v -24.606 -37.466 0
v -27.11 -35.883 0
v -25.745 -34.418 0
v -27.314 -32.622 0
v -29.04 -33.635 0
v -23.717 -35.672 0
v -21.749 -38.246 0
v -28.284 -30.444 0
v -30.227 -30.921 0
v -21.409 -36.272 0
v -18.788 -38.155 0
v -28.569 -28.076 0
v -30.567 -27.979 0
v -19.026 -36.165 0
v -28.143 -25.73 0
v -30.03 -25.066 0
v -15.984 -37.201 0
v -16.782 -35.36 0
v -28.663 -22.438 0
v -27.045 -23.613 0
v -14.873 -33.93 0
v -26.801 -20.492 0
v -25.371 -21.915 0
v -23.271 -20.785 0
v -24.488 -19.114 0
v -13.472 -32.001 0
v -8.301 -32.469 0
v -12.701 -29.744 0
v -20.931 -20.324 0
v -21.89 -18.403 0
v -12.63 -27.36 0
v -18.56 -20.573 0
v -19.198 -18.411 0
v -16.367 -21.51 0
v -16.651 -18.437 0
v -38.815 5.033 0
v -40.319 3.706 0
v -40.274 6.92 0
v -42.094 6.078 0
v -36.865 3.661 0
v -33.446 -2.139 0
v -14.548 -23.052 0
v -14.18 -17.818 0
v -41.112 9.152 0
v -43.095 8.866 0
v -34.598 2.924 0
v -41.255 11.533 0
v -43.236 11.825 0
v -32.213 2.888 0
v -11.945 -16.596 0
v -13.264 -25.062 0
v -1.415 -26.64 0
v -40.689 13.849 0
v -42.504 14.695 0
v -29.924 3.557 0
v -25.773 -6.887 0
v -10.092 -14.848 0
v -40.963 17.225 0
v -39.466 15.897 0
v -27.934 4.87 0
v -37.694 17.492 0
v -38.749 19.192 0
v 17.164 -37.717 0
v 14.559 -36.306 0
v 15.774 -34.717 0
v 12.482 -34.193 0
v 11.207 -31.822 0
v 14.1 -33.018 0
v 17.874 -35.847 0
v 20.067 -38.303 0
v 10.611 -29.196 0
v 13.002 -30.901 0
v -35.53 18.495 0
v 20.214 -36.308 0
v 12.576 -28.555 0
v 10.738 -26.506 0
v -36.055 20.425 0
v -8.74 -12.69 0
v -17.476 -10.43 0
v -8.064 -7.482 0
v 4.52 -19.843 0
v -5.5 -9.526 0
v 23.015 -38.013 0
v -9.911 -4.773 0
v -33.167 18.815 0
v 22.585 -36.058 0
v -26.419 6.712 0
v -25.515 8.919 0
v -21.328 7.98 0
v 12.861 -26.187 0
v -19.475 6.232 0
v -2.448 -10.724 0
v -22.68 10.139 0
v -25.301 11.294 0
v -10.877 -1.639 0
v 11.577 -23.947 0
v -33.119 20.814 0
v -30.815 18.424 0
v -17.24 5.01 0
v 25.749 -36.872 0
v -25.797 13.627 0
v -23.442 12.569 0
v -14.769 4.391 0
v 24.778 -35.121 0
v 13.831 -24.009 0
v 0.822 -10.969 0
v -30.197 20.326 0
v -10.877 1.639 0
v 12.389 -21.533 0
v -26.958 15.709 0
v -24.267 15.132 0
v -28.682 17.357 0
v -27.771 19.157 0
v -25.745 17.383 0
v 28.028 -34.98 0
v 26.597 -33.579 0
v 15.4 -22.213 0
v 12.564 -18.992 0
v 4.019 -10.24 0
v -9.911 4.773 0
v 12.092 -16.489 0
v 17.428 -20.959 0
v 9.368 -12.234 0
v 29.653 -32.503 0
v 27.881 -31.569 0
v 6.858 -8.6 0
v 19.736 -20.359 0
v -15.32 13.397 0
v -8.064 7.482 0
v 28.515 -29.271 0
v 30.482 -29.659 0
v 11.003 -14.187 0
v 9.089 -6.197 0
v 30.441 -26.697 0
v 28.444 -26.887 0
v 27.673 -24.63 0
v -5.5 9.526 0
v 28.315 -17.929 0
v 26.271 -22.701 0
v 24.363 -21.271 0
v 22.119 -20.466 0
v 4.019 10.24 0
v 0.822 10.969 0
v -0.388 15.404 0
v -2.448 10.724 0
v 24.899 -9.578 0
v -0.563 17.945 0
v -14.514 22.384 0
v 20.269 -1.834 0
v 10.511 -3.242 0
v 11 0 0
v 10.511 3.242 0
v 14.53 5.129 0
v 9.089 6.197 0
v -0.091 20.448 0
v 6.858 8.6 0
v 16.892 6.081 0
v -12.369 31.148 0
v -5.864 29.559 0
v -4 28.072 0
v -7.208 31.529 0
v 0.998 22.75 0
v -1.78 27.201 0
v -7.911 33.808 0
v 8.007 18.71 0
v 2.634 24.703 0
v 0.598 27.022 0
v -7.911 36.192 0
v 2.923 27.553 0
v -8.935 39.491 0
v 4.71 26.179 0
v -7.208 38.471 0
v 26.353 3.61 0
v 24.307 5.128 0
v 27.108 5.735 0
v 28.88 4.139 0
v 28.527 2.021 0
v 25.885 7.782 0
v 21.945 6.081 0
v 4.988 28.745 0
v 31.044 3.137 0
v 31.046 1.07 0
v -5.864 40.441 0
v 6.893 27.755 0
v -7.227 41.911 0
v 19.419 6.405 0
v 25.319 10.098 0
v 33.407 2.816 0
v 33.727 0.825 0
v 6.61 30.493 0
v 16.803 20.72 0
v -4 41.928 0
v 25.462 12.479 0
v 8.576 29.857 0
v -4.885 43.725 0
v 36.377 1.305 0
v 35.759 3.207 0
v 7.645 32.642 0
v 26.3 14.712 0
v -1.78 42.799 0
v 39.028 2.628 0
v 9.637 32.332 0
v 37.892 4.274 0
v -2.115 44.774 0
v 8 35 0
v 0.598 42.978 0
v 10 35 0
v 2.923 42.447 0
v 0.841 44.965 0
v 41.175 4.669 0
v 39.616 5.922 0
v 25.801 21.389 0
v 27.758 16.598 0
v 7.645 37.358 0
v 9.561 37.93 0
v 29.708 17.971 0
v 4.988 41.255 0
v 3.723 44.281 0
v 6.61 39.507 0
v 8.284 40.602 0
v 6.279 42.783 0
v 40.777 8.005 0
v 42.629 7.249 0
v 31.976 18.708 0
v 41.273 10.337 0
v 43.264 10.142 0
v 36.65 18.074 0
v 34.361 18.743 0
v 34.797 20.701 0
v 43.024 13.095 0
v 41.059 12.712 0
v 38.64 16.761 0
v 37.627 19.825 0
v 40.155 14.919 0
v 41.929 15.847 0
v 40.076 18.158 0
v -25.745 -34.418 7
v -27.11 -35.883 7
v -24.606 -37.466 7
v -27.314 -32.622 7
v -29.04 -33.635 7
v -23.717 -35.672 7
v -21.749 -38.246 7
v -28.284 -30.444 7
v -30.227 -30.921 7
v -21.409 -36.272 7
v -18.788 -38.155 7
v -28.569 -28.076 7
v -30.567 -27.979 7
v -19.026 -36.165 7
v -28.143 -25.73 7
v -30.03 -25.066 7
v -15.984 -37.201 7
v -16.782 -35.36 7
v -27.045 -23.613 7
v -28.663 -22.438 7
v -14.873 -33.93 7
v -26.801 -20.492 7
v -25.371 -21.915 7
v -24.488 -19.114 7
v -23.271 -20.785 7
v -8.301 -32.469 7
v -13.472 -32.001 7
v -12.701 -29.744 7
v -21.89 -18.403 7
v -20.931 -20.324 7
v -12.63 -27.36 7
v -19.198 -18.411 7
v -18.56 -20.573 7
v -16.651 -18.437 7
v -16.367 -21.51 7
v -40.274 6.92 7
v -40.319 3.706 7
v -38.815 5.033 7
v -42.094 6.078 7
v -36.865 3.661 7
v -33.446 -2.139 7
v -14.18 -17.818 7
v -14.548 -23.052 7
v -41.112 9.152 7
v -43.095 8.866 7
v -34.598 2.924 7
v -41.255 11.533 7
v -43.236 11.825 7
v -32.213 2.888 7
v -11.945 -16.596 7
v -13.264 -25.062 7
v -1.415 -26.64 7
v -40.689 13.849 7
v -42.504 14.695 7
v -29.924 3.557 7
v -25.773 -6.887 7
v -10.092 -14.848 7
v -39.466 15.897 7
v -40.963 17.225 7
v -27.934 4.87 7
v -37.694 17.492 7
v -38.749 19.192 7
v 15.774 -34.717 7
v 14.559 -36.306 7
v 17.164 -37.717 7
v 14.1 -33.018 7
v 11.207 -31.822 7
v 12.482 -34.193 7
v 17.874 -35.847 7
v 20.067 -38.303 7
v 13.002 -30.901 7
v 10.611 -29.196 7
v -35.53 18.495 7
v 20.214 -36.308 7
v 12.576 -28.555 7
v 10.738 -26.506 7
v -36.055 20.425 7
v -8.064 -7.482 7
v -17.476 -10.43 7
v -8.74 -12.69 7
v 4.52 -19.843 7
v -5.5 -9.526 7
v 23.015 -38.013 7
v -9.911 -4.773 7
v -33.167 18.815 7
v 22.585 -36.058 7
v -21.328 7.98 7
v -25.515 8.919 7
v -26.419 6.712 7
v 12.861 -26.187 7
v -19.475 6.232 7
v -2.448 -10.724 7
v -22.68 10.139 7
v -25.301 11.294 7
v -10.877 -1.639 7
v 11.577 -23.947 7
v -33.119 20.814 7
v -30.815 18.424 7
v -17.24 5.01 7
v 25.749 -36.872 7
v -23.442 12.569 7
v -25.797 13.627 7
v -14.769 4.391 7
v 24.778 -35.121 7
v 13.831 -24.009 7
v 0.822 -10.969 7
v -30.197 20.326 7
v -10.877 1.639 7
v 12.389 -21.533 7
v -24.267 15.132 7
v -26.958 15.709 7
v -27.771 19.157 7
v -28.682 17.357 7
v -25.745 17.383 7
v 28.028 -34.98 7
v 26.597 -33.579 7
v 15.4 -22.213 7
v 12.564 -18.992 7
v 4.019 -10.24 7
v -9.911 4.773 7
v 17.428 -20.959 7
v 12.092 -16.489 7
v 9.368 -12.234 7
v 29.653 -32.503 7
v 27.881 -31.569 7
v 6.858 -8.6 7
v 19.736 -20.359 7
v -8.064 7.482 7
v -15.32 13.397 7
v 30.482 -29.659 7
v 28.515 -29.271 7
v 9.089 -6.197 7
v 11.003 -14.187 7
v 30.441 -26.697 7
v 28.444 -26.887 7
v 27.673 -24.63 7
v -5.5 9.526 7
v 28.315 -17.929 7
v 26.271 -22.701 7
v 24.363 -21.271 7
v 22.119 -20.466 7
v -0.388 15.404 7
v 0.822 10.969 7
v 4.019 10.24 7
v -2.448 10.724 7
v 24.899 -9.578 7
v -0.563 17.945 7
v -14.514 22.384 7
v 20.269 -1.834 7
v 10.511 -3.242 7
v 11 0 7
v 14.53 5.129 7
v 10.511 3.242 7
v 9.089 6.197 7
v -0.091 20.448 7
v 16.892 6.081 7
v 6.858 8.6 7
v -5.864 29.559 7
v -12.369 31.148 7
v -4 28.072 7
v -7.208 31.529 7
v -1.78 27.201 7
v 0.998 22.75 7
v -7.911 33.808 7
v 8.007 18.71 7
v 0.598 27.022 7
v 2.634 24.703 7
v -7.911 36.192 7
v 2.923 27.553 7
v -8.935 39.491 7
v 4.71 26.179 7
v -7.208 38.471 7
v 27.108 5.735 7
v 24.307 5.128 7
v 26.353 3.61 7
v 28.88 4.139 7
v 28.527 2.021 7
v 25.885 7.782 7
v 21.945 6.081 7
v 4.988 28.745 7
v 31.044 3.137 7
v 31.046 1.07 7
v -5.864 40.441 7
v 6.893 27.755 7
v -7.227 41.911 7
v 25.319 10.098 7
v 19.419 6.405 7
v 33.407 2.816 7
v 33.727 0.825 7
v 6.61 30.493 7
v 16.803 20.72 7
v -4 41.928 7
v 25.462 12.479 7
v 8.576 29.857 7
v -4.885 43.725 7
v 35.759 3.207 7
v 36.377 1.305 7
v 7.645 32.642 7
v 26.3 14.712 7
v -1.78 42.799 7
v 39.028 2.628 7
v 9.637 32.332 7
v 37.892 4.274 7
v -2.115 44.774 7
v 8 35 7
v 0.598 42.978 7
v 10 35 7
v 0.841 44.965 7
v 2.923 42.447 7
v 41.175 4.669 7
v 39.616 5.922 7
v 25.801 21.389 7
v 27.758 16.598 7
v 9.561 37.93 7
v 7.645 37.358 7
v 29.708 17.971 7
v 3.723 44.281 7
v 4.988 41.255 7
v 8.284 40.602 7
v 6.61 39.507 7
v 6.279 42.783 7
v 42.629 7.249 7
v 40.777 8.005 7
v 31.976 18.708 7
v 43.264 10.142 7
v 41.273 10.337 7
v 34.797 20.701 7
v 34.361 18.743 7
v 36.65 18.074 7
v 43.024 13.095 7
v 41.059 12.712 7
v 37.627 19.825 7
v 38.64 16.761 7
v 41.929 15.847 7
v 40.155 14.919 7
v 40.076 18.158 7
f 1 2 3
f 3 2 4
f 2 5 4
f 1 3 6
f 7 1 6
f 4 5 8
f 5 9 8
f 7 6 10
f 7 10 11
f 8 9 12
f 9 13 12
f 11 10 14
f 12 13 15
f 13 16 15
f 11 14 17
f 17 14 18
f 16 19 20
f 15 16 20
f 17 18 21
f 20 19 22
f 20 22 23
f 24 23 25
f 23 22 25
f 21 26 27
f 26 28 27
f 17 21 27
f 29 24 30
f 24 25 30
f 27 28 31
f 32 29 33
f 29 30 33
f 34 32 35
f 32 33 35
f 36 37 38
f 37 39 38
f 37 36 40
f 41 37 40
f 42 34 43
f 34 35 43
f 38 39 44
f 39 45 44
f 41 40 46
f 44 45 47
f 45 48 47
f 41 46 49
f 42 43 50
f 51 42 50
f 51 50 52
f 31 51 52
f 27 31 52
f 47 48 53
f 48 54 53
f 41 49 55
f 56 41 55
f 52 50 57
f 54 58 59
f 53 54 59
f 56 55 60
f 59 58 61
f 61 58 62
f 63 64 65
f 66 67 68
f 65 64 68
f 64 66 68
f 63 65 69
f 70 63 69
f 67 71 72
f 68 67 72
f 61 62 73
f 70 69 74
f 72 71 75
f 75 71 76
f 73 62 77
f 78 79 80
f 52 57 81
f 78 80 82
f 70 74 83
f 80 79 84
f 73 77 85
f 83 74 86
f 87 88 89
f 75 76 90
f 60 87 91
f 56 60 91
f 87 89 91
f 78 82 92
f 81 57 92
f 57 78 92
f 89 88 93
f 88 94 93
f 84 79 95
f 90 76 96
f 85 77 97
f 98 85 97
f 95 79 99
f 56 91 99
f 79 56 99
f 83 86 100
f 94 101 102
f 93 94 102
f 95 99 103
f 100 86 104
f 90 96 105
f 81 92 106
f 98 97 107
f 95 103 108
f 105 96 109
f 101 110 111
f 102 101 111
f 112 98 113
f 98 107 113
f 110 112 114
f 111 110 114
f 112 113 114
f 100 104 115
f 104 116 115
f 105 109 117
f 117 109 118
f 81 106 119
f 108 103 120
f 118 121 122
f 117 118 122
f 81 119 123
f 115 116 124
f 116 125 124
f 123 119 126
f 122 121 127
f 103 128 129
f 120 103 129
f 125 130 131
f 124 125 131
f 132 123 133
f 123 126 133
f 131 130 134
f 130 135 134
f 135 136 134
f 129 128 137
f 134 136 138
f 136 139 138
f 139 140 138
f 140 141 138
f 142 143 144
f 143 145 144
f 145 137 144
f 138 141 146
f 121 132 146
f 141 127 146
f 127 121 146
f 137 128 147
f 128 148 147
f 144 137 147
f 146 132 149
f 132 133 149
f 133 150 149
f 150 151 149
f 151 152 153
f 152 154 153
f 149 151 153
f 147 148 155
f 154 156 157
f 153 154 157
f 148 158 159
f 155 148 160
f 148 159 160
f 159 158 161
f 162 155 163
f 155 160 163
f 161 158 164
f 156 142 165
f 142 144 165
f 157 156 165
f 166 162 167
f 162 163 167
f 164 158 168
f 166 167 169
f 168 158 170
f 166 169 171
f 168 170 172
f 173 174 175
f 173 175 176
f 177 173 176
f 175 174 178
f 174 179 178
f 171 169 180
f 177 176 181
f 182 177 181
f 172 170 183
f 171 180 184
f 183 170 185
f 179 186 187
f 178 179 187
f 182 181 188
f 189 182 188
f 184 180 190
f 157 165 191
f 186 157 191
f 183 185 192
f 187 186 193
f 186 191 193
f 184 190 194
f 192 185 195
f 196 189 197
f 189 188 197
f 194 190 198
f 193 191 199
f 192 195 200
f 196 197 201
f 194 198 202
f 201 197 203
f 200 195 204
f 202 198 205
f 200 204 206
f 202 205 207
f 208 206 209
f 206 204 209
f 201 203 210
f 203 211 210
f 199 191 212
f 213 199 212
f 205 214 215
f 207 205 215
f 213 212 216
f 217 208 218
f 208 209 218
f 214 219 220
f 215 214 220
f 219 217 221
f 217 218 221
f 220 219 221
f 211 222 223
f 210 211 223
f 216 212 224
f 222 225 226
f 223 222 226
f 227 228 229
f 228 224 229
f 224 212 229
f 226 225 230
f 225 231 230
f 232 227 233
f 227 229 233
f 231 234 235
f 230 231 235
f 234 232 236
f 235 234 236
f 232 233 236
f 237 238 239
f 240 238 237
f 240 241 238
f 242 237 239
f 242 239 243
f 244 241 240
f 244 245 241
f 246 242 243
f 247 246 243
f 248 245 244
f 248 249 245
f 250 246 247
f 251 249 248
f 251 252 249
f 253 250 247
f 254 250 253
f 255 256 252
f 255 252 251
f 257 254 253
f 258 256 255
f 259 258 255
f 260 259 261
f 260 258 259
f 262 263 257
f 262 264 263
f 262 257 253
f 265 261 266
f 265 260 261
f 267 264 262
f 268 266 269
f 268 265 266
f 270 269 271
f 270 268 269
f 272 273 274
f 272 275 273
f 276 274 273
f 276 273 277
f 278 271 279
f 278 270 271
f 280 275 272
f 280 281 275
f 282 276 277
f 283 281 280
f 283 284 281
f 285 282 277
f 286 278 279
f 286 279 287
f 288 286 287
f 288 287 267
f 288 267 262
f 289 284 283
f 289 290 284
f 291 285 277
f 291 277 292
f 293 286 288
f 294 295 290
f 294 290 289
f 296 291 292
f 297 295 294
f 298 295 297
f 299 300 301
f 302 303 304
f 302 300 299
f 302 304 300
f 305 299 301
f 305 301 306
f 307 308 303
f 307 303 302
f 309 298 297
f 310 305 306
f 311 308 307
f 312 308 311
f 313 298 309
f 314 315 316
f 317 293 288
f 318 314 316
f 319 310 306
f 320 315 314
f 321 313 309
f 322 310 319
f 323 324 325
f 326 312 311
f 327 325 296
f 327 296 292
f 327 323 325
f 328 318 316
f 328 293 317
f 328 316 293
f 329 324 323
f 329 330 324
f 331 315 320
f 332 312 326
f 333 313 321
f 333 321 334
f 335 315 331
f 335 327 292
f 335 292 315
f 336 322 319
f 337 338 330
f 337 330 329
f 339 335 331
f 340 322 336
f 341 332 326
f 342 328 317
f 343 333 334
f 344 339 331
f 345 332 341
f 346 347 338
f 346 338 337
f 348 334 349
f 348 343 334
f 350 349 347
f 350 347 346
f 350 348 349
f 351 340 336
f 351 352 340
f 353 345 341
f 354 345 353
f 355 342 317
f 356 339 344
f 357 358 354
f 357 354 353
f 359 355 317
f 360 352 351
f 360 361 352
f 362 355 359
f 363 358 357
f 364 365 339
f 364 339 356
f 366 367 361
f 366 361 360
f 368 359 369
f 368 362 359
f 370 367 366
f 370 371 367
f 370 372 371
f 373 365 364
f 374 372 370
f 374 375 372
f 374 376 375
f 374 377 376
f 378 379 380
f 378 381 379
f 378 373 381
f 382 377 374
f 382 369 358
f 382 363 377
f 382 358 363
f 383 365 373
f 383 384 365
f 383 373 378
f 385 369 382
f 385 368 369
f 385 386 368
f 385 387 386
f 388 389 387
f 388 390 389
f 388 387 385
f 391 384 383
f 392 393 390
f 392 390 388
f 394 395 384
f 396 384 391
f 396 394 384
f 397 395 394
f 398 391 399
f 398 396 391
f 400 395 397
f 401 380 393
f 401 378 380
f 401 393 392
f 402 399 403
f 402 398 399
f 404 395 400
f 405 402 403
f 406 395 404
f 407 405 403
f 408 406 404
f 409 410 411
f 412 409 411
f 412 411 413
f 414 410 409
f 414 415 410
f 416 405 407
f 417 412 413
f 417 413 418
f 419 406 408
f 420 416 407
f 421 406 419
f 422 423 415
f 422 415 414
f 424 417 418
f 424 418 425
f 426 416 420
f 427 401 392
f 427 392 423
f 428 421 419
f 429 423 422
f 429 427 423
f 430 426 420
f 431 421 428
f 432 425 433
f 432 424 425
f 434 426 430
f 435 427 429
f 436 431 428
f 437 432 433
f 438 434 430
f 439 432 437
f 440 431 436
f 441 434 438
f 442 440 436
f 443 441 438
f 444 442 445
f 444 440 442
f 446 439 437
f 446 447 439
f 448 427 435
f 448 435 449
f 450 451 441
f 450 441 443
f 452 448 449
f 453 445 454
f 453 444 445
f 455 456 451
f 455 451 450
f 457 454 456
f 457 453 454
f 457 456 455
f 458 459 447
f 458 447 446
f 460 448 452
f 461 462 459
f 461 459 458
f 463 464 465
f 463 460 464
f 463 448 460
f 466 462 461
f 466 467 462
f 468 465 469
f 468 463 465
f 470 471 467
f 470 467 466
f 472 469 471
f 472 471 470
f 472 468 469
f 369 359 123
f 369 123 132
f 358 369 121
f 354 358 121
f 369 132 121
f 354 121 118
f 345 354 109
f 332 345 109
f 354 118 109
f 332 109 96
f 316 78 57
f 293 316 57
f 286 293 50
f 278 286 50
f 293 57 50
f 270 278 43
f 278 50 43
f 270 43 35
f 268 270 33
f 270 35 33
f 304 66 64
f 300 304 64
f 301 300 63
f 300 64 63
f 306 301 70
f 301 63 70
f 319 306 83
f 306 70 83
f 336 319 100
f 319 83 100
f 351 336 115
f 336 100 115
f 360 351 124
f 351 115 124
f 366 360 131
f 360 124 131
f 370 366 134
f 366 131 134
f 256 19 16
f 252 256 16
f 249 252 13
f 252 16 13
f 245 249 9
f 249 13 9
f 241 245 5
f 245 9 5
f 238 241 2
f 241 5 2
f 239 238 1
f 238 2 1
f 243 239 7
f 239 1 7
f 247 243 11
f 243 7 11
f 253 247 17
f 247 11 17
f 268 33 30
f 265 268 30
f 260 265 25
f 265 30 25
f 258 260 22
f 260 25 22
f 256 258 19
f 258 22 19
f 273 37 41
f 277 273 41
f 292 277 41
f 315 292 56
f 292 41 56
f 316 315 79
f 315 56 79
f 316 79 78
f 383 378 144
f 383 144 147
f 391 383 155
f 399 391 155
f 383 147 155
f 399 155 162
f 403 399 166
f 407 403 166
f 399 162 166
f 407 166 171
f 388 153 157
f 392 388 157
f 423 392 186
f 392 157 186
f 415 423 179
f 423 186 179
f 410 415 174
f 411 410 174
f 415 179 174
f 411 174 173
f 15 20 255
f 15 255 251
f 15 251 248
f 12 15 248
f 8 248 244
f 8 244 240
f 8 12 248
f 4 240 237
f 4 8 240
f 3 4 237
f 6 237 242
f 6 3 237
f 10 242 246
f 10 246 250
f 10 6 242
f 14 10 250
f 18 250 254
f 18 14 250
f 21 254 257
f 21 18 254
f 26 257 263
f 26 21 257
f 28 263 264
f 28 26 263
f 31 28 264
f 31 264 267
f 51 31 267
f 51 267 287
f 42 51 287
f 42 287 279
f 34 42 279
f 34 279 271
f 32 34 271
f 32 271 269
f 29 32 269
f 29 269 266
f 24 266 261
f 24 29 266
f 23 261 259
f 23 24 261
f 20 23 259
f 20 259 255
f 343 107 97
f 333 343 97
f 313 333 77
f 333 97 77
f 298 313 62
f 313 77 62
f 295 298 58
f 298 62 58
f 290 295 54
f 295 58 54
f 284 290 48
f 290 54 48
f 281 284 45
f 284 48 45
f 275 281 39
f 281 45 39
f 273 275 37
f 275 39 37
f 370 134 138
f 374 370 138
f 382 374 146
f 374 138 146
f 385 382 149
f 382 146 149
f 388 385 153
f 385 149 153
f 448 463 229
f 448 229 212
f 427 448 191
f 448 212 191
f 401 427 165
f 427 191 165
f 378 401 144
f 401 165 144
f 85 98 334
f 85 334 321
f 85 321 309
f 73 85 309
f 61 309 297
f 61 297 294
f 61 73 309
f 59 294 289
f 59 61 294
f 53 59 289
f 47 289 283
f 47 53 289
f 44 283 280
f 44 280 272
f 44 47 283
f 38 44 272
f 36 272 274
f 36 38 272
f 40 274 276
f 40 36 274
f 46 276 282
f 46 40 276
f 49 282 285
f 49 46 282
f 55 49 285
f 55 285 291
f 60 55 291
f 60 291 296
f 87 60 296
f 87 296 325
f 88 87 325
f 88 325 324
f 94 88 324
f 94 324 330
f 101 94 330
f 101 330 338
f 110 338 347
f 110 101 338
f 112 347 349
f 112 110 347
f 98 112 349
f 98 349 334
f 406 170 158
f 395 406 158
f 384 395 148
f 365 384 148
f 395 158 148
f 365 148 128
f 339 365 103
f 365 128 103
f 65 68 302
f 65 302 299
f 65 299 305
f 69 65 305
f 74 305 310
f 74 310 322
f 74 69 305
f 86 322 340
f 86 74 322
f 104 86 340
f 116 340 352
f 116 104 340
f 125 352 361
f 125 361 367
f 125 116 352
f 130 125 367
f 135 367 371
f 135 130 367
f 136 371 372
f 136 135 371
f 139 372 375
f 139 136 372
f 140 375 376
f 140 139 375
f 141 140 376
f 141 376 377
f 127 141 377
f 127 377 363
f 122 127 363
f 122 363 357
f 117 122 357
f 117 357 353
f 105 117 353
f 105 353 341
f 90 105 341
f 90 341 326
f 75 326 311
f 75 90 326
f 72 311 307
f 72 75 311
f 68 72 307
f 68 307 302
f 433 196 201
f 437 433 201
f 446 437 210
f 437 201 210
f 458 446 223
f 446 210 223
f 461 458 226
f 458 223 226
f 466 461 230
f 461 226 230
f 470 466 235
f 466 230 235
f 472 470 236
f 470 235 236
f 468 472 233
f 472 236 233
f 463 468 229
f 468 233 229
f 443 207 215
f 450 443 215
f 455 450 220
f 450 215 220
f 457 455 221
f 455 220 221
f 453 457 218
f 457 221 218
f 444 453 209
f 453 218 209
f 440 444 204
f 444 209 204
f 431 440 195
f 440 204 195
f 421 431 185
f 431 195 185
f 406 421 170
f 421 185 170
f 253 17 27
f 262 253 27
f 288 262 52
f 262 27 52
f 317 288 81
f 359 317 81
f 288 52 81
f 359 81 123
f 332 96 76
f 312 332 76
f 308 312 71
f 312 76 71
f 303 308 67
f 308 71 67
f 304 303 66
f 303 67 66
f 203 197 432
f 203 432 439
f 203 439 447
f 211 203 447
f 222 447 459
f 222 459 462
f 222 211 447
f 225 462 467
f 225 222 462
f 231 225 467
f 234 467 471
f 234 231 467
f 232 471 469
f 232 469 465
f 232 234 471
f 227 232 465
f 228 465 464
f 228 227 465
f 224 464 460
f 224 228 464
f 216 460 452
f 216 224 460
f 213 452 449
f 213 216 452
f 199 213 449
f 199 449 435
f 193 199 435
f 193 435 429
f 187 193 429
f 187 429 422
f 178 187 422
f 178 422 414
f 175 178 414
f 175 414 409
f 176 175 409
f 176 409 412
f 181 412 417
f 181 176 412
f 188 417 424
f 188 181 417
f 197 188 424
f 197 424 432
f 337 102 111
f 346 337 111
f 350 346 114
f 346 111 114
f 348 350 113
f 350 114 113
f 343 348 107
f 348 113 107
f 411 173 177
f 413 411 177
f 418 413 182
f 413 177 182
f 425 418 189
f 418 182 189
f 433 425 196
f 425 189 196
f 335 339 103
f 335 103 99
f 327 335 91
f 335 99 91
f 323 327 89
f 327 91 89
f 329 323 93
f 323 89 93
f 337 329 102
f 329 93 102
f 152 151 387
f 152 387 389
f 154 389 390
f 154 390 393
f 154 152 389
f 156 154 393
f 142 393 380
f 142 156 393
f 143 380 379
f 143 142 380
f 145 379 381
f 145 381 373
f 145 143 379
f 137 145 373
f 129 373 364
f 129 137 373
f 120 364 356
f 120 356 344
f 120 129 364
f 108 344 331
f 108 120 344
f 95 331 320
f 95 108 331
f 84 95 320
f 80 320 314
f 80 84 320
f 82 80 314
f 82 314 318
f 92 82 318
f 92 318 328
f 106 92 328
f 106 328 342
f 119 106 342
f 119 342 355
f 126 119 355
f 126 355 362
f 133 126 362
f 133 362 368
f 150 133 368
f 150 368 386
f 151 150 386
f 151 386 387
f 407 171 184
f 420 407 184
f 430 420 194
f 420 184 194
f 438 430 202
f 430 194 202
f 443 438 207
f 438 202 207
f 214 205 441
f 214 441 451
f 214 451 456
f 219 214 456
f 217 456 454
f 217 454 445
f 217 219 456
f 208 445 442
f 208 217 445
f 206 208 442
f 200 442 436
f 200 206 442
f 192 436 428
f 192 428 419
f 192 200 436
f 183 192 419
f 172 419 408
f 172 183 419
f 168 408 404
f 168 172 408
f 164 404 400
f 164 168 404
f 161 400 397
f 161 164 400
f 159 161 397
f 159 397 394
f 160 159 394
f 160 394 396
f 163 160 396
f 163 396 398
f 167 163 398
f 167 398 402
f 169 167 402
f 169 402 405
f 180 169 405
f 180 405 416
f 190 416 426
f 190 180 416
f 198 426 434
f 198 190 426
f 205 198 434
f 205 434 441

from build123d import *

# Parameters (mm, degrees)
F1_R     = 11
F1_R_2   = 8
F2_DEPTH = 7
F3_COUNT = 5


with BuildPart() as f2:
    # F1 (on Top) → F2 (new body)
    with BuildSketch(Plane.XY):
        with BuildLine():
            ThreePointArc((-14, 0), (0, -14), (14, 0))
            ThreePointArc((14, 0), (9.8994949366, 9.8994949366), (0, 14))
            ThreePointArc((0, 14), (-9.8994949366, 9.8994949366), (-14, 0))
        make_face()
        Circle(F1_R, mode=Mode.SUBTRACT)
        with BuildLine():
            ThreePointArc((-14, 0), (-9.8994949366, 9.8994949366), (0, 14))
            ThreePointArc((0, 14), (0.0928065847, 20.9641089066), (4.7098193128, 26.1785714286))
            ThreePointArc((4.7098193128, 26.1785714286), (-6.9834201124, 27.8423576834), (-8.9347861793, 39.4910573288))
            ThreePointArc((-8.9347861793, 39.4910573288), (-14.8385397391, 20.1779196855), (-14, 0))
        make_face()
        with BuildLine():
            ThreePointArc((-8.9347861793, 39.4910573288), (-6.9834201124, 27.8423576834), (4.7098193128, 26.1785714286))
            ThreePointArc((4.7098193128, 26.1785714286), (8.5760769915, 29.8569558201), (10, 35))
            ThreePointArc((10, 35), (2.307827789, 44.730052975), (-8.9347861793, 39.4910573288))
        make_face()
        with Locations((0, 35)):
            Circle(F1_R_2, mode=Mode.SUBTRACT)
    extrude(amount=F2_DEPTH)

    # F3: F2 ×5 about axis
    f3_axis = Axis((0, 0, 7), (0, 0, 1))


with BuildPart() as f2_1:
    add(f2.part)
    for i in range(1, F3_COUNT):
        add(f2.part.rotate(f3_axis, i * 360 / F3_COUNT))


solid = f2_1.part
